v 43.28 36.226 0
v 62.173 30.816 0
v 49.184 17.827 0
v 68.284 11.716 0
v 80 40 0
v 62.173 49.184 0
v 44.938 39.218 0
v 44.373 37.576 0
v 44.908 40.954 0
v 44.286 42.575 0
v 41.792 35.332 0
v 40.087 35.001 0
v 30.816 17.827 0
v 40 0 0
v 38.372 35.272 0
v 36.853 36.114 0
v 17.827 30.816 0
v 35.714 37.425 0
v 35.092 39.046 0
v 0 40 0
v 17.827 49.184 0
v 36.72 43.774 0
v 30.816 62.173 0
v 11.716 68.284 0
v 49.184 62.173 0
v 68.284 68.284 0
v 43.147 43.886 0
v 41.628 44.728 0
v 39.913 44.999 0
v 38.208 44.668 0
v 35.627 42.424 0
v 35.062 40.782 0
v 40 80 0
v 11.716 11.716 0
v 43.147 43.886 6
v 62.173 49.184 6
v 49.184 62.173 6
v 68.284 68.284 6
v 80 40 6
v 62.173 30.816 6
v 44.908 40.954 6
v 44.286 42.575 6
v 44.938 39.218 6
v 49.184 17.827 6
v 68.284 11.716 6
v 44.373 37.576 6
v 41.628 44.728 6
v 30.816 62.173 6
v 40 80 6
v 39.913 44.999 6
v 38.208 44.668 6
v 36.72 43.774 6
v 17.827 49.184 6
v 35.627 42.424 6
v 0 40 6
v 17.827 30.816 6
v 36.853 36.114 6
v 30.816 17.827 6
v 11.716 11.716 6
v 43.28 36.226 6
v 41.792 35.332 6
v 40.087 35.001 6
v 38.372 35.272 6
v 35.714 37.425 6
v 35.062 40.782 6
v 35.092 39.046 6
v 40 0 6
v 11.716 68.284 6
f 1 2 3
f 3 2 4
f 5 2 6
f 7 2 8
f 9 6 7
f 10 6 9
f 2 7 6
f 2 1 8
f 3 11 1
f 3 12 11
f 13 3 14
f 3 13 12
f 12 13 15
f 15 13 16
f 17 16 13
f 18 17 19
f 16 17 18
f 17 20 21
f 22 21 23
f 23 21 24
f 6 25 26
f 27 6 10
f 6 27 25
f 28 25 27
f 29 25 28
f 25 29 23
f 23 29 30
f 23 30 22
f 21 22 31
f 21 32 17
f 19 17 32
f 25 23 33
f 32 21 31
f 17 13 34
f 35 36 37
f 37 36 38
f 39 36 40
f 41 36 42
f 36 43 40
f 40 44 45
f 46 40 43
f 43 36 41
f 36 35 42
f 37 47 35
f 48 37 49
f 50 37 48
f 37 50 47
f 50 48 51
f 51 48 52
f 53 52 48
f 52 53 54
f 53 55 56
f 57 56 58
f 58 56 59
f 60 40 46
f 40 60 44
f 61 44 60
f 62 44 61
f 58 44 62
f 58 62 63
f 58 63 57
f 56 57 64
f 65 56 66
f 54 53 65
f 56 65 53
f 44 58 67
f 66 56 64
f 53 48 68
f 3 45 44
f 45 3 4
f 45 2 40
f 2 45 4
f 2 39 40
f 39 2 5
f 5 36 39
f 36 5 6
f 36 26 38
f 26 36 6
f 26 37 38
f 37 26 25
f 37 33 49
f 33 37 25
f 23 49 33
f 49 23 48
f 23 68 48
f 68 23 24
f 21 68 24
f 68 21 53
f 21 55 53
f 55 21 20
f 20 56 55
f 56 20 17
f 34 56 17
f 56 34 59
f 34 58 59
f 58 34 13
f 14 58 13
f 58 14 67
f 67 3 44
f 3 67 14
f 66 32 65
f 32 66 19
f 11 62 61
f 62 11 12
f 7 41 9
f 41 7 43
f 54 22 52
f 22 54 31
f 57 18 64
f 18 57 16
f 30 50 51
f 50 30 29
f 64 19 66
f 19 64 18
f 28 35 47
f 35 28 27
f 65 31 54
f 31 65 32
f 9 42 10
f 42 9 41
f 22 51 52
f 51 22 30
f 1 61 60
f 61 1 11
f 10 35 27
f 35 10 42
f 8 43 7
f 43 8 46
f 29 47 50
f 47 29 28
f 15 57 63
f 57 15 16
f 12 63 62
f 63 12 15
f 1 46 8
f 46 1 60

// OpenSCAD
$fn = 32;

// ----------------------------------------------------------------------
// Star wheel: 8-point blunt, R40
// ----------------------------------------------------------------------

// --- parameters (mm) ---
n_points = 8;             // number of points / teeth
r_out = 40;               // tip radius
r_in = 24;                // root radius
bore_r = 5;               // centre bore radius
plate_t = 6;              // plate thickness, Z (extrusion height)
bore_d = 10;              // centre bore diameter

profile = [[40, 80], [30.816, 62.173], [11.716, 68.284], [17.827, 49.184], [0, 40], [17.827, 30.816], [11.716, 11.716], [30.816, 17.827], [40, 0], [49.184, 17.827], [68.284, 11.716], [62.173, 30.816], [80, 40], [62.173, 49.184], [68.284, 68.284], [49.184, 62.173]];  // primary outline, 16 points, counter clockwise
void_1 = [[44.908, 40.954], [44.286, 42.575], [43.147, 43.886], [41.628, 44.728], [39.913, 44.999], [38.208, 44.668], [36.72, 43.774], [35.627, 42.424], [35.062, 40.782], [35.092, 39.046], [35.714, 37.425], [36.853, 36.114], [38.372, 35.272], [40.087, 35.001], [41.792, 35.332], [43.28, 36.226], [44.373, 37.576], [44.938, 39.218]];  // centre bore, 18 points

// --- the one profile operation ---
difference() {
  linear_extrude(height = plate_t) polygon(points = profile);
  translate([0, 0, -1])
    linear_extrude(height = plate_t + 2) polygon(points = void_1);
}
